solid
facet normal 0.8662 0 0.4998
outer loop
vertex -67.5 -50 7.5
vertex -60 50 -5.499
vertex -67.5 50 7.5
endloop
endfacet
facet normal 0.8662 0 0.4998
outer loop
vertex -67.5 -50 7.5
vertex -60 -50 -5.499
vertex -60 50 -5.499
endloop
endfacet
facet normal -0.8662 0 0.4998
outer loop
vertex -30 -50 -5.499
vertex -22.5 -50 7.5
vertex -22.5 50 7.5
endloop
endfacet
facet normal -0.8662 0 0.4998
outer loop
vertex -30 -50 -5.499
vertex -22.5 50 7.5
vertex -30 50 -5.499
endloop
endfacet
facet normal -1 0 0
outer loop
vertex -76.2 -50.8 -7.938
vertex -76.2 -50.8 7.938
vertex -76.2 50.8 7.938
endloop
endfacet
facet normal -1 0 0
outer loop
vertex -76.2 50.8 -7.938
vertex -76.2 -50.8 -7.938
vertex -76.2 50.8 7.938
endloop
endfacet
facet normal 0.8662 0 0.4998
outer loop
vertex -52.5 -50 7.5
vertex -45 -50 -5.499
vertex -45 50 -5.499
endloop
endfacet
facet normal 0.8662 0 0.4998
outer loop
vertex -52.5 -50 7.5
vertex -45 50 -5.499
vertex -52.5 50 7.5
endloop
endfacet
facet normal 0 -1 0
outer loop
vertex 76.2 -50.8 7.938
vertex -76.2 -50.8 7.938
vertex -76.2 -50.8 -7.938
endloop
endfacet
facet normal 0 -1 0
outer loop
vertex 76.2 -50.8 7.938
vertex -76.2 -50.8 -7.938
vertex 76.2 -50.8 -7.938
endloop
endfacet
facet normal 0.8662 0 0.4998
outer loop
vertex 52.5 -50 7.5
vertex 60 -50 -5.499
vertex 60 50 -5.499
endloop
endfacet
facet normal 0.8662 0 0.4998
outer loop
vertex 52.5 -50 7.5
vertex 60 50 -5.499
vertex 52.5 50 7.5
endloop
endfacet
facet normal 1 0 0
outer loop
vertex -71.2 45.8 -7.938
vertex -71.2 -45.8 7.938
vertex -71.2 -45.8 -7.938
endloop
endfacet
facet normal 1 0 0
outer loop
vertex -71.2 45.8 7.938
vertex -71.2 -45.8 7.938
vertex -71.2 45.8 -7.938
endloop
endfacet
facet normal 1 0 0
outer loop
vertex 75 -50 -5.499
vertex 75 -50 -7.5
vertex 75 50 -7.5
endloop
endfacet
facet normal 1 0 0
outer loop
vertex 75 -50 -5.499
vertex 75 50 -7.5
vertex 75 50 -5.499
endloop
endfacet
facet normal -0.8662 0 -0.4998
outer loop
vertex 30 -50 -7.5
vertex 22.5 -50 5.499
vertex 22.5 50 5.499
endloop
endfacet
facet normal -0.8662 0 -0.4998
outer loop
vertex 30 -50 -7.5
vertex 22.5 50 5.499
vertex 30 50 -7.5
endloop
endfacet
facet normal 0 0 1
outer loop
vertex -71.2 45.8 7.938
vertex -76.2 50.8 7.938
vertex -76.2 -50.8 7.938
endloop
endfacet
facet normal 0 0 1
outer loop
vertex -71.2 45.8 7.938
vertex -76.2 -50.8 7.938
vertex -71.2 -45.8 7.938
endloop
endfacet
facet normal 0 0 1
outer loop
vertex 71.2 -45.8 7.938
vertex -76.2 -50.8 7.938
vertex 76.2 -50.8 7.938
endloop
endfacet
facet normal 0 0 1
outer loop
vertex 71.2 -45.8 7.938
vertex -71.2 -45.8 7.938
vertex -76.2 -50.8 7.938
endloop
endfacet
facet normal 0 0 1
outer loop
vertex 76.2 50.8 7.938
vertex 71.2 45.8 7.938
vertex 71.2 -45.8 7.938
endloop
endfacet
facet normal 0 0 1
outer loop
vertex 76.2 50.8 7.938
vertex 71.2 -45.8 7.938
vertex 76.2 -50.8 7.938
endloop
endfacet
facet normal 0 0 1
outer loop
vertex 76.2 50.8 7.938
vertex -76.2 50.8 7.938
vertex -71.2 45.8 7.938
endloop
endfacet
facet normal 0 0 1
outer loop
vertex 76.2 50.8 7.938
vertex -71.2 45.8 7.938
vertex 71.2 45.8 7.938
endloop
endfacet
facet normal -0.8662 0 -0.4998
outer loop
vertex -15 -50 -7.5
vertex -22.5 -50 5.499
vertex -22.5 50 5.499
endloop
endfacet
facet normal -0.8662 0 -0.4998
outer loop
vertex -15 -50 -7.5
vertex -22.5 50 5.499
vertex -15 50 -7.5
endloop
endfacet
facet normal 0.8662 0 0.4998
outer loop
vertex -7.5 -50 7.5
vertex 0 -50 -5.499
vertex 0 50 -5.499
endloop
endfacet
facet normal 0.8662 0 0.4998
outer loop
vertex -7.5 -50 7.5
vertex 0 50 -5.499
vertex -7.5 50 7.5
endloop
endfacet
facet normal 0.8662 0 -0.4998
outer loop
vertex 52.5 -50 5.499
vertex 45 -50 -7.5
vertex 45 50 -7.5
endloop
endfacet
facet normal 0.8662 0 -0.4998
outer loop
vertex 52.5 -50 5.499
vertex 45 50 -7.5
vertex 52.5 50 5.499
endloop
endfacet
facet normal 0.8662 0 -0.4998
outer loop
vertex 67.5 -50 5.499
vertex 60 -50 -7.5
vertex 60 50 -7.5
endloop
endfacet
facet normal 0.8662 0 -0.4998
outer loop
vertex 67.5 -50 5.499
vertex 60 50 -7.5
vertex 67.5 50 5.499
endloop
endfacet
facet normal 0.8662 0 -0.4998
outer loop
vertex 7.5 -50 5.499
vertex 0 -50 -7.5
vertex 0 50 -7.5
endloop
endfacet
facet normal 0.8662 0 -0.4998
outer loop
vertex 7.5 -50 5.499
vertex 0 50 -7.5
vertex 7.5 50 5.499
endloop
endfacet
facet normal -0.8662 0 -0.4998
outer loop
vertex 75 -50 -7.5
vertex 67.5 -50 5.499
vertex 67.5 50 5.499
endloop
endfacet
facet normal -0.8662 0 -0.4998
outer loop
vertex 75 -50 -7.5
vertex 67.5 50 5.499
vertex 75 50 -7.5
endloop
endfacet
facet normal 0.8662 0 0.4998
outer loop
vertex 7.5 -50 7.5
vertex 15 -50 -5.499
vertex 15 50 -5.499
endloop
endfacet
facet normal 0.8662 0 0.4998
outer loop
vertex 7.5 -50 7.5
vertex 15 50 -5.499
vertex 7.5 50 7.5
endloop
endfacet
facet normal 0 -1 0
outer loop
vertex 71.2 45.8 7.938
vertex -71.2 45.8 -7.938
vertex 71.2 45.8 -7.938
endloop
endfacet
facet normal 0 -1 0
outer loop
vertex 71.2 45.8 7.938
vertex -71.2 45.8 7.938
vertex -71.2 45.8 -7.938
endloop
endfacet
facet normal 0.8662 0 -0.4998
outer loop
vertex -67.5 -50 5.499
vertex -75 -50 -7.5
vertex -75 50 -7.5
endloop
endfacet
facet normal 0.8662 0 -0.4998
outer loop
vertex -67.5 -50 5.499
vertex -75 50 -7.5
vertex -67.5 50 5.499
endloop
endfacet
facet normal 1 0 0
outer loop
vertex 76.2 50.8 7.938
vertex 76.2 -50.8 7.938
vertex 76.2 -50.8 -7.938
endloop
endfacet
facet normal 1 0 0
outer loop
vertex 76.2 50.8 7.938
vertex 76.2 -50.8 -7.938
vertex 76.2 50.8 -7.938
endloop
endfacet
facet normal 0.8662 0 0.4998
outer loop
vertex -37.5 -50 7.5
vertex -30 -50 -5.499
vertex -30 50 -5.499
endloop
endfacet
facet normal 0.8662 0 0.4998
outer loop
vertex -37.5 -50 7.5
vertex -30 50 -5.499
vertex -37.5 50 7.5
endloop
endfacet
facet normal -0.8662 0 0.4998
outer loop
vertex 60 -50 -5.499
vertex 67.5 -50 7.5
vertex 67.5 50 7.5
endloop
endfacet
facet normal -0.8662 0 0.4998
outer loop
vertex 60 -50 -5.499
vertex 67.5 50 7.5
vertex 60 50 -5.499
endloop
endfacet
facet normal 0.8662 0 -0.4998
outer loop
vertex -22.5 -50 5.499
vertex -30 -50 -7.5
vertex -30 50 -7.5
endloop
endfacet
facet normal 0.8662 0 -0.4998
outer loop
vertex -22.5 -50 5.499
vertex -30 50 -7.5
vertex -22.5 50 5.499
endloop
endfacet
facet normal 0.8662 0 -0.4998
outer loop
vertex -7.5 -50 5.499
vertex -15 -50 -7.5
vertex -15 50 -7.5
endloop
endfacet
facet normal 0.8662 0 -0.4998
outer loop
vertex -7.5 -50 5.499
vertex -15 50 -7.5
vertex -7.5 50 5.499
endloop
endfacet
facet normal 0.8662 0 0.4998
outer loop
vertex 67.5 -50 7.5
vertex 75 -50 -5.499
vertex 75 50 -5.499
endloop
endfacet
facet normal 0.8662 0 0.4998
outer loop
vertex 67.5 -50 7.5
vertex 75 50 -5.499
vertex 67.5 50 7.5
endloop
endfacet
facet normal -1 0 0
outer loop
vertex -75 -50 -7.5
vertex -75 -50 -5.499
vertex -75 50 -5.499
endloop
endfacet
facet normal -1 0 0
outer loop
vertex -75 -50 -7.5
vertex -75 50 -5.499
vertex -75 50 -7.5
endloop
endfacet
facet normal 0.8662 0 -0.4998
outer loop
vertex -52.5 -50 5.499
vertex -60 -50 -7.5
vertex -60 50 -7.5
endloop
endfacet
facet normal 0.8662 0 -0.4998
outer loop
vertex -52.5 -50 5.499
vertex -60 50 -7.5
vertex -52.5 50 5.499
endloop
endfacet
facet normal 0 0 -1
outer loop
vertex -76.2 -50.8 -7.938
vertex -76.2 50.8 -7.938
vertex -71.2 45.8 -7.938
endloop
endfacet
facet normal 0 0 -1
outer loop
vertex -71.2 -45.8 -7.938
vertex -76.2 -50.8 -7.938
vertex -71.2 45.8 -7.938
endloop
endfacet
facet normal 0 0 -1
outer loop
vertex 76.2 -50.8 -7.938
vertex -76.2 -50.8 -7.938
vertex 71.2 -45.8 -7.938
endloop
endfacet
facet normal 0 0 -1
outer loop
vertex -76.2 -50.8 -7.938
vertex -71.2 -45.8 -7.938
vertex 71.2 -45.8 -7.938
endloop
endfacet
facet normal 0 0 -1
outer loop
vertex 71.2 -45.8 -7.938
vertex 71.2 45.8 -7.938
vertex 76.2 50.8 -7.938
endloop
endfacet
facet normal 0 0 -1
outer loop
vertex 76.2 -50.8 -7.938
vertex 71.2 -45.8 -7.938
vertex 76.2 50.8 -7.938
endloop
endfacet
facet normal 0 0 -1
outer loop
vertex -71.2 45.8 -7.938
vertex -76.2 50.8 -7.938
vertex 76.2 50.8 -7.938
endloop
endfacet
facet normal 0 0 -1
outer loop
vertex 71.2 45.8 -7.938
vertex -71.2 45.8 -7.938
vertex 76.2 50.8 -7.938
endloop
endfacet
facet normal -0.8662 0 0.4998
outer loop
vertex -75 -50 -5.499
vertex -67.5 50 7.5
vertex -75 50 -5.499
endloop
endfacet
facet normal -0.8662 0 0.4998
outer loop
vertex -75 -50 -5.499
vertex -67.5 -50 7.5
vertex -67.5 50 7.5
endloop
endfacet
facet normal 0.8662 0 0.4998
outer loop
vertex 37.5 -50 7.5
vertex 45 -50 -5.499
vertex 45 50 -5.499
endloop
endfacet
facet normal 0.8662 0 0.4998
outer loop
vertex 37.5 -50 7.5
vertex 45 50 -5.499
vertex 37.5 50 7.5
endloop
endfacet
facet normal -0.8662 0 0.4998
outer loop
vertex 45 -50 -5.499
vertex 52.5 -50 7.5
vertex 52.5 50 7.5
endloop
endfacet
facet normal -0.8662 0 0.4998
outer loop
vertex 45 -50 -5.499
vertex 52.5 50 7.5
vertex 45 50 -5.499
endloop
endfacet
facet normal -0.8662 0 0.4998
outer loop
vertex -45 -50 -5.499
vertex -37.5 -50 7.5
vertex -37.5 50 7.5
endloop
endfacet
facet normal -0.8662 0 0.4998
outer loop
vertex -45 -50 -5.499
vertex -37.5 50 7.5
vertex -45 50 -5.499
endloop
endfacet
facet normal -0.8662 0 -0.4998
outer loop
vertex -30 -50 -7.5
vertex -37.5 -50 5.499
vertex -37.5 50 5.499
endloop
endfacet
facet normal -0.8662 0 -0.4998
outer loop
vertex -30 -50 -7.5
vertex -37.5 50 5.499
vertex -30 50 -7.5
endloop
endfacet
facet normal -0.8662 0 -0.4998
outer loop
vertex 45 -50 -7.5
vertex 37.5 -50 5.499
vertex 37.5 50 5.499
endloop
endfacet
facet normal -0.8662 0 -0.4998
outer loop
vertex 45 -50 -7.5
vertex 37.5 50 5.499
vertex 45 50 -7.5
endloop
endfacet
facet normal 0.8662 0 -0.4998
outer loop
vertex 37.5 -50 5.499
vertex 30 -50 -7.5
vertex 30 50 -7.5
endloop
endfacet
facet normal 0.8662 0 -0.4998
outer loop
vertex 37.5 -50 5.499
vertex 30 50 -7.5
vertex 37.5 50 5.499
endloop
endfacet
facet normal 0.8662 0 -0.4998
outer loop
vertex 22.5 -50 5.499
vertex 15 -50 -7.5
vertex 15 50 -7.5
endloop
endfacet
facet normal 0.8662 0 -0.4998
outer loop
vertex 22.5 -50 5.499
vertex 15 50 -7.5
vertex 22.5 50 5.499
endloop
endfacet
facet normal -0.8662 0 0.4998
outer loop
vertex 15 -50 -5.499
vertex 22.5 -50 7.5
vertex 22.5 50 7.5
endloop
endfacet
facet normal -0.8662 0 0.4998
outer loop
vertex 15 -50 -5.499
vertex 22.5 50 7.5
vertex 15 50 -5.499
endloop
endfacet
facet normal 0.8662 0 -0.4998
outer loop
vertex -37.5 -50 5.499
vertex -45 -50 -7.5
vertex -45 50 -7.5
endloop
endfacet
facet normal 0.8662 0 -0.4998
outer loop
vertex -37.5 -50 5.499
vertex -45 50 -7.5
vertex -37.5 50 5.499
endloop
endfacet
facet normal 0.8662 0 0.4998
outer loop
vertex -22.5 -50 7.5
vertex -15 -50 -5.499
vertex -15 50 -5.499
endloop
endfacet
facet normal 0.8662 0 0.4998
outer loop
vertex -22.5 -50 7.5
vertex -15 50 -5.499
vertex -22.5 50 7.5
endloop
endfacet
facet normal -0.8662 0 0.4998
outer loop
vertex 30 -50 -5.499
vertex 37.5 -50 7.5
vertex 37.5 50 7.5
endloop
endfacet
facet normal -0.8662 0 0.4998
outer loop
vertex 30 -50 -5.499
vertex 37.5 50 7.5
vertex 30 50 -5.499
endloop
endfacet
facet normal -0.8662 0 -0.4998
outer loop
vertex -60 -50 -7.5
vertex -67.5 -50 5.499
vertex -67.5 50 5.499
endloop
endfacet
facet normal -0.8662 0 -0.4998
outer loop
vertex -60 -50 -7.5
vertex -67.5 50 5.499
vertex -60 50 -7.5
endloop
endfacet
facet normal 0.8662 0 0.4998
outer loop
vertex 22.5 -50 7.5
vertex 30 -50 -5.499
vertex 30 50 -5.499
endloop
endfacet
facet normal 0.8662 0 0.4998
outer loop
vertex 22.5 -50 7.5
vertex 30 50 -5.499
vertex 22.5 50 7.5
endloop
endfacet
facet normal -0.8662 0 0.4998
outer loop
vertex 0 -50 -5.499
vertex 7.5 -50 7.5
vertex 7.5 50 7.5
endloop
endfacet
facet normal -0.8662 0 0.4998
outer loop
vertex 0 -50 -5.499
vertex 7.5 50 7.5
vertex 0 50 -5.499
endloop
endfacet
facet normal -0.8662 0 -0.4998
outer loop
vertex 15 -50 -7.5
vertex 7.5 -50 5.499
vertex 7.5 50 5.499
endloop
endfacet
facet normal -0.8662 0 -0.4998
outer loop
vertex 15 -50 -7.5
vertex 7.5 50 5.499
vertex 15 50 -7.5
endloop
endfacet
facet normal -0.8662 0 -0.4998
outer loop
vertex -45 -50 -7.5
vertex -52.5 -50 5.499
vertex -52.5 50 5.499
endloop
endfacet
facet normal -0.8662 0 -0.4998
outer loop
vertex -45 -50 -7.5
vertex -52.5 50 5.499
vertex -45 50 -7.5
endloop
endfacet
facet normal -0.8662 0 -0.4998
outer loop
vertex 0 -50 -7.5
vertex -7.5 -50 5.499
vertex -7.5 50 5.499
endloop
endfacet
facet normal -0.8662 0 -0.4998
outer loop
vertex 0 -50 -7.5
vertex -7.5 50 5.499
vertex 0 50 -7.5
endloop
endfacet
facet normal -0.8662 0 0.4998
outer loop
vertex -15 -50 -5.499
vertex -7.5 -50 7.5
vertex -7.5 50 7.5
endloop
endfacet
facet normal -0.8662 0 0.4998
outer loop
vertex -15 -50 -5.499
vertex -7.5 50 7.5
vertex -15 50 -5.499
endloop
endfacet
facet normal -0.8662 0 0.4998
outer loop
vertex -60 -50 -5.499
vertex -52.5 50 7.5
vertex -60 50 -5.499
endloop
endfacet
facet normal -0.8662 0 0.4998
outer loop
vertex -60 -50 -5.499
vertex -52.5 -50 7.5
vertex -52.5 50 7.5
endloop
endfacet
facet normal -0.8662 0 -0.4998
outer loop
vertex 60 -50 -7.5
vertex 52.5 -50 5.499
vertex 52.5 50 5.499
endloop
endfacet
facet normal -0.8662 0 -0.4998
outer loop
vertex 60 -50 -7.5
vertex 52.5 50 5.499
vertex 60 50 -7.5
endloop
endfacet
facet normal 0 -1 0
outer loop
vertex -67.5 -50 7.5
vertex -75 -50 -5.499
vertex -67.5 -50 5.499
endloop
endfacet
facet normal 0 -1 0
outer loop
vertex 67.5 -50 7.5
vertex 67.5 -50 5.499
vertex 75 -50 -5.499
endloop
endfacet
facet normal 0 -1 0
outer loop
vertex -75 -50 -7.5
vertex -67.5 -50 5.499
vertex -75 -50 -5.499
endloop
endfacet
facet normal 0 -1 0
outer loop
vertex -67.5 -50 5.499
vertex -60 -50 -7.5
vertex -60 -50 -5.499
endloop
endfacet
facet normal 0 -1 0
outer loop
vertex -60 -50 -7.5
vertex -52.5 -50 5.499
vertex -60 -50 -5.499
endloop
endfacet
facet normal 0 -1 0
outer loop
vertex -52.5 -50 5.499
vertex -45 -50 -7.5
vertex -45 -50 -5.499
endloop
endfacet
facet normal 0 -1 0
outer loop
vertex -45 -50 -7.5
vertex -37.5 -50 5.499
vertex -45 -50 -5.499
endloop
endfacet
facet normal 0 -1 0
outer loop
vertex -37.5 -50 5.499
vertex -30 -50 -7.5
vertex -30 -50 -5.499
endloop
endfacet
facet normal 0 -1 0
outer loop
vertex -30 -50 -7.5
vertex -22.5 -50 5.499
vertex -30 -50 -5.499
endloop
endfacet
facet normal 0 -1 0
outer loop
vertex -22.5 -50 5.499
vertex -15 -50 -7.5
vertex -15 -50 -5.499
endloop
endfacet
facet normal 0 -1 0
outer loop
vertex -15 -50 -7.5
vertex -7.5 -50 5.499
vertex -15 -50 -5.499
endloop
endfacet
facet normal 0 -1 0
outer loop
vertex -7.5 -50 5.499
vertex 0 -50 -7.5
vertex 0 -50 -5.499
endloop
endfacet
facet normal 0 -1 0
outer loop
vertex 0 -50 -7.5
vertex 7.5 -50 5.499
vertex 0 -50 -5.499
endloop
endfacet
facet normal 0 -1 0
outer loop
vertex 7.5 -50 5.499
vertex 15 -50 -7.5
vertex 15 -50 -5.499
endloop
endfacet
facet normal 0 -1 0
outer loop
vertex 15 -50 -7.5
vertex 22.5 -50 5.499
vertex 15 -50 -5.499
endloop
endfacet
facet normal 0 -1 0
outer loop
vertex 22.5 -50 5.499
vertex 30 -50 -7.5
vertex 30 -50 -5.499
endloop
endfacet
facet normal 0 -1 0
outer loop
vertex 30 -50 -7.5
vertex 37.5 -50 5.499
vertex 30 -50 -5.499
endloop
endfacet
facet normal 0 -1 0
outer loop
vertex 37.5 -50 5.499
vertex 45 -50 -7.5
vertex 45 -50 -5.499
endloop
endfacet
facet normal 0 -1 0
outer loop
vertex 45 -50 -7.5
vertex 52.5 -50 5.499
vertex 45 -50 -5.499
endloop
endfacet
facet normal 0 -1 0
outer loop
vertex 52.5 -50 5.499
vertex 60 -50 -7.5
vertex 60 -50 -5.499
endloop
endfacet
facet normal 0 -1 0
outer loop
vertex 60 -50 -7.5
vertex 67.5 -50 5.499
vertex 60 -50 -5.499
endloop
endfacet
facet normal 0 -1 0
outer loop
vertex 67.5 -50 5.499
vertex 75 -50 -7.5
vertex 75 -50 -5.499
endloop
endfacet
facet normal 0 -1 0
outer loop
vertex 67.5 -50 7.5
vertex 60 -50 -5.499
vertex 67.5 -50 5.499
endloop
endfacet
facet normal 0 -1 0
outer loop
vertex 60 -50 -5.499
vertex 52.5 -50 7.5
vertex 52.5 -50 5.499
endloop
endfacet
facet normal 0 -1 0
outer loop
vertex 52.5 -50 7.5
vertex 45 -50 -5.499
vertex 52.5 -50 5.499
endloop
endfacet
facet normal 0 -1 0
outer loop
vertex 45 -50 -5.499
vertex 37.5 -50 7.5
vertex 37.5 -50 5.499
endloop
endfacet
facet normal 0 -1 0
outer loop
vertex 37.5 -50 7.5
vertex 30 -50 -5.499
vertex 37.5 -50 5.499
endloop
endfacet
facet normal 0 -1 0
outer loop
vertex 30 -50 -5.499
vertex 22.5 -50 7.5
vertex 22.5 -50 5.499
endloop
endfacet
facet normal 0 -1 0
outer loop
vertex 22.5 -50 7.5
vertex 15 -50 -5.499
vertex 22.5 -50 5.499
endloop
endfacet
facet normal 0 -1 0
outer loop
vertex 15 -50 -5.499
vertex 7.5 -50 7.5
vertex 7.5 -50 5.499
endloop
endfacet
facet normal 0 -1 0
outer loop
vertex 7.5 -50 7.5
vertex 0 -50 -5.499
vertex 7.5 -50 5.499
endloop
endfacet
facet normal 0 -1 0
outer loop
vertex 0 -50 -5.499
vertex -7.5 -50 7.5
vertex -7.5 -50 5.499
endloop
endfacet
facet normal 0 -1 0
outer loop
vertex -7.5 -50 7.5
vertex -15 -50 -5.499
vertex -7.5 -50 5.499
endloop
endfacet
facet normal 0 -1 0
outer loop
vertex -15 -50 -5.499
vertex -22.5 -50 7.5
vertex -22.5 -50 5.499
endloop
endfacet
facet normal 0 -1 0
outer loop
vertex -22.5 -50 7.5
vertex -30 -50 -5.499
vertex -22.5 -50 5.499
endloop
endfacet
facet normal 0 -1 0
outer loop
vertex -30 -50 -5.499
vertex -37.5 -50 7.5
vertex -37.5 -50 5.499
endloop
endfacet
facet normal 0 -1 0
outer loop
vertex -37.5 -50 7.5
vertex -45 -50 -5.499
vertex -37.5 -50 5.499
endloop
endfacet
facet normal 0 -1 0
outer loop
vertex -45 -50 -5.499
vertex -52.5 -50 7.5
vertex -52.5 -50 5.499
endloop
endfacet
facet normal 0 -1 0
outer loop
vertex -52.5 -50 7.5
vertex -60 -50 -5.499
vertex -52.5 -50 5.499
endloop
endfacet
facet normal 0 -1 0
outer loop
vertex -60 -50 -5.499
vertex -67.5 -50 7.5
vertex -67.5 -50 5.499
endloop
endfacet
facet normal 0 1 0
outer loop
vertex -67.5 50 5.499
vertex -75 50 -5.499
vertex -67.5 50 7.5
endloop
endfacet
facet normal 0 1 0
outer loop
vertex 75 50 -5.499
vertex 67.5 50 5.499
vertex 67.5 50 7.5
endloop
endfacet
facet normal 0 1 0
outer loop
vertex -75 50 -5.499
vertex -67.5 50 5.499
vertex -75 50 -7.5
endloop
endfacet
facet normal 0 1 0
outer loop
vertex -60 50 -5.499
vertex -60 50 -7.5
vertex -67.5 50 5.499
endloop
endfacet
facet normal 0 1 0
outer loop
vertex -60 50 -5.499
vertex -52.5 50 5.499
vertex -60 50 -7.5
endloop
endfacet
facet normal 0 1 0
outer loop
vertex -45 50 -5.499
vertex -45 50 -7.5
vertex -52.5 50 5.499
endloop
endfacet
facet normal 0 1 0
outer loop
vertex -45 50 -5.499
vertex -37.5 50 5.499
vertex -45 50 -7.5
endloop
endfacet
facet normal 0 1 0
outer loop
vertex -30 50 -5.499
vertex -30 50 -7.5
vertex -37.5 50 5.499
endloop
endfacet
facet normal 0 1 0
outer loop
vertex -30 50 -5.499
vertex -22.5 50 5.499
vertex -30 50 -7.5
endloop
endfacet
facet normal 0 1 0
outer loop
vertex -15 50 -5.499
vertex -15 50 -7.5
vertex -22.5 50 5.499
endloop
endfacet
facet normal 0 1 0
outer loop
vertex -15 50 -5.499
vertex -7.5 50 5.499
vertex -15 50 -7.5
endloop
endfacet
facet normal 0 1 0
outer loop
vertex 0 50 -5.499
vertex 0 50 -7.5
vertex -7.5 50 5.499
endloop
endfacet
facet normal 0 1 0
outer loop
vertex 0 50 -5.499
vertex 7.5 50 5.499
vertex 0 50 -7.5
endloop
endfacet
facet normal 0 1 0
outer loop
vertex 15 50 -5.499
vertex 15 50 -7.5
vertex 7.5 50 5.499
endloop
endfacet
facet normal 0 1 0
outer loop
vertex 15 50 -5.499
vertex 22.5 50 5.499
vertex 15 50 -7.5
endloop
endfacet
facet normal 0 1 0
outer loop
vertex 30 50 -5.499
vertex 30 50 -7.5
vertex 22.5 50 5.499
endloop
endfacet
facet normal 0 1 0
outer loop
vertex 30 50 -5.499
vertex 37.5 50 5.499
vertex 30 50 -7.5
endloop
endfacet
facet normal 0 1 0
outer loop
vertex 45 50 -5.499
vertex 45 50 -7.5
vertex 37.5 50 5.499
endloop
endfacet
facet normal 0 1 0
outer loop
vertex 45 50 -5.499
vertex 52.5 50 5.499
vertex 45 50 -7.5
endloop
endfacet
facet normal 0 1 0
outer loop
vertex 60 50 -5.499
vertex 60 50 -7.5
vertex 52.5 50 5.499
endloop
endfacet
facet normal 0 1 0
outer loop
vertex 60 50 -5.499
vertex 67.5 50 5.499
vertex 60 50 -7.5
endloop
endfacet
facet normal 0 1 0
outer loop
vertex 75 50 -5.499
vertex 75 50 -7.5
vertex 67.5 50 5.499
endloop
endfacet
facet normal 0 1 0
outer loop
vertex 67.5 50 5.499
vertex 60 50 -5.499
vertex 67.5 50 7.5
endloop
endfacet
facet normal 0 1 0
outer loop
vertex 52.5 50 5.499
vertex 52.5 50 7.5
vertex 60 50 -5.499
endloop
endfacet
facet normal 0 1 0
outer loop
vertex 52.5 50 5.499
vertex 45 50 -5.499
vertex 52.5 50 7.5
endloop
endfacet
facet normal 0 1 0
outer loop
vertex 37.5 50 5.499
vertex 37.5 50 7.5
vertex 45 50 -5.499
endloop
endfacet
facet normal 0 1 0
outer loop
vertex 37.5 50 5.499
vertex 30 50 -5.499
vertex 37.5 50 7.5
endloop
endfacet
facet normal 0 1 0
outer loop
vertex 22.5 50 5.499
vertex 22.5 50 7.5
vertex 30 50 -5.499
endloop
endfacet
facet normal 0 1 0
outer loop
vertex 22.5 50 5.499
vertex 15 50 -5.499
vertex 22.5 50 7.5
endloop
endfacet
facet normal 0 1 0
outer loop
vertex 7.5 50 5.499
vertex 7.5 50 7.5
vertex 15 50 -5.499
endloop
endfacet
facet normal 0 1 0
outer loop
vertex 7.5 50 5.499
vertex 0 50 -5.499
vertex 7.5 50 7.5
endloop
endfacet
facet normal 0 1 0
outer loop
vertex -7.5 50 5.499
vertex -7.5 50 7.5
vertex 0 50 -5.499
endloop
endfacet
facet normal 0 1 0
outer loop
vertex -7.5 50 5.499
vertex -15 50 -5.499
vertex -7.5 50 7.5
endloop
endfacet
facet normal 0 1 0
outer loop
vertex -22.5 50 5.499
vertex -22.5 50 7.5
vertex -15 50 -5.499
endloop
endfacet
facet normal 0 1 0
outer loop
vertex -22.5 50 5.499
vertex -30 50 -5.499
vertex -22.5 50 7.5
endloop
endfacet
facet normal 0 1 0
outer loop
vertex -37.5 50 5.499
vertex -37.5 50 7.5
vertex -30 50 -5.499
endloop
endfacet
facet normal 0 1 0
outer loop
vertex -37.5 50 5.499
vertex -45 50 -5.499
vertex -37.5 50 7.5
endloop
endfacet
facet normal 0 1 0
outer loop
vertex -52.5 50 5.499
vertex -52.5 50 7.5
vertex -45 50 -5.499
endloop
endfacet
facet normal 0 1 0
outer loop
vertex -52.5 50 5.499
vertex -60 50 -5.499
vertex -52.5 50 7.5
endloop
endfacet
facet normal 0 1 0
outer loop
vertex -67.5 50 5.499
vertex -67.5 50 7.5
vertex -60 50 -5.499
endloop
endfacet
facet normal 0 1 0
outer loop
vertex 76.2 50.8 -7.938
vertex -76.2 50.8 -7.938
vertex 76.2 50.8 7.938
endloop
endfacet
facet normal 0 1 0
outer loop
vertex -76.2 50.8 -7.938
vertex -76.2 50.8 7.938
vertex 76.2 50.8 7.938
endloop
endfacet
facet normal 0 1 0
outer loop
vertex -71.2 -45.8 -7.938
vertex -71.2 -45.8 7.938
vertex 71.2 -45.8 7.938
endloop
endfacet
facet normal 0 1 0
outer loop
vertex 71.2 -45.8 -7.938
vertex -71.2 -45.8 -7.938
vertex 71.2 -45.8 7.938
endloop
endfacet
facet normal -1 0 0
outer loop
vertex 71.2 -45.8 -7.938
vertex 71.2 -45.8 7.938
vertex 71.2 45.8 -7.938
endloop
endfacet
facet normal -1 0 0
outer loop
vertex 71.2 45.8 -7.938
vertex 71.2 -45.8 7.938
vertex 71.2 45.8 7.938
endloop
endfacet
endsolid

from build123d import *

# Parameters (mm, degrees)
F1_DEPTH = 50
F2_W     = 152.4
F2_H     = 101.6
F2_W_2   = 142.4
F2_H_2   = 91.6
F3_DEPTH = 7.9375


# Not quite as in the source:
# - a length typed as a fraction of an inch, garbled in the dataset ("3 / 203.2 mm" for 3/8 in), is restored
# - a feature names something its author has since deleted; it is built from what else it names


with BuildPart() as f1:
    # F0 (on Front) → F1 (new body, symmetric)
    with BuildSketch(Plane.XZ):
        Polygon((-67.5, 7.5), (-75, -5.4990042023), (-75, -7.5), (-67.5, 5.4990042023), (-60, -7.5), (-52.5, 5.4990042023), (-45, -7.5), (-37.5, 5.4990042023), (-30, -7.5), (-22.5, 5.4990042023), (-15, -7.5), (-7.5, 5.4990042023), (0, -7.5), (7.5, 5.4990042023), (15, -7.5), (22.5, 5.4990042023), (30, -7.5), (37.5, 5.4990042023), (45, -7.5), (52.5, 5.4990042023), (60, -7.5), (67.5, 5.4990042023), (75, -7.5), (75, -5.4990042023), (67.5, 7.5), (60, -5.4990042023), (52.5, 7.5), (45, -5.4990042023), (37.5, 7.5), (30, -5.4990042023), (22.5, 7.5), (15, -5.4990042023), (7.5, 7.5), (0, -5.4990042023), (-7.5, 7.5), (-15, -5.4990042023), (-22.5, 7.5), (-30, -5.4990042023), (-37.5, 7.5), (-45, -5.4990042023), (-52.5, 7.5), (-60, -5.4990042023), align=None)
    extrude(amount=F1_DEPTH, both=True)


with BuildPart() as f3:
    # F2 (on Top) → F3 (new body, symmetric)
    with BuildSketch(Plane.XY):
        Rectangle(F2_W, F2_H)
        Rectangle(F2_W_2, F2_H_2, mode=Mode.SUBTRACT)
    extrude(amount=F3_DEPTH, both=True)


solid = Compound([f1.part, f3.part])
